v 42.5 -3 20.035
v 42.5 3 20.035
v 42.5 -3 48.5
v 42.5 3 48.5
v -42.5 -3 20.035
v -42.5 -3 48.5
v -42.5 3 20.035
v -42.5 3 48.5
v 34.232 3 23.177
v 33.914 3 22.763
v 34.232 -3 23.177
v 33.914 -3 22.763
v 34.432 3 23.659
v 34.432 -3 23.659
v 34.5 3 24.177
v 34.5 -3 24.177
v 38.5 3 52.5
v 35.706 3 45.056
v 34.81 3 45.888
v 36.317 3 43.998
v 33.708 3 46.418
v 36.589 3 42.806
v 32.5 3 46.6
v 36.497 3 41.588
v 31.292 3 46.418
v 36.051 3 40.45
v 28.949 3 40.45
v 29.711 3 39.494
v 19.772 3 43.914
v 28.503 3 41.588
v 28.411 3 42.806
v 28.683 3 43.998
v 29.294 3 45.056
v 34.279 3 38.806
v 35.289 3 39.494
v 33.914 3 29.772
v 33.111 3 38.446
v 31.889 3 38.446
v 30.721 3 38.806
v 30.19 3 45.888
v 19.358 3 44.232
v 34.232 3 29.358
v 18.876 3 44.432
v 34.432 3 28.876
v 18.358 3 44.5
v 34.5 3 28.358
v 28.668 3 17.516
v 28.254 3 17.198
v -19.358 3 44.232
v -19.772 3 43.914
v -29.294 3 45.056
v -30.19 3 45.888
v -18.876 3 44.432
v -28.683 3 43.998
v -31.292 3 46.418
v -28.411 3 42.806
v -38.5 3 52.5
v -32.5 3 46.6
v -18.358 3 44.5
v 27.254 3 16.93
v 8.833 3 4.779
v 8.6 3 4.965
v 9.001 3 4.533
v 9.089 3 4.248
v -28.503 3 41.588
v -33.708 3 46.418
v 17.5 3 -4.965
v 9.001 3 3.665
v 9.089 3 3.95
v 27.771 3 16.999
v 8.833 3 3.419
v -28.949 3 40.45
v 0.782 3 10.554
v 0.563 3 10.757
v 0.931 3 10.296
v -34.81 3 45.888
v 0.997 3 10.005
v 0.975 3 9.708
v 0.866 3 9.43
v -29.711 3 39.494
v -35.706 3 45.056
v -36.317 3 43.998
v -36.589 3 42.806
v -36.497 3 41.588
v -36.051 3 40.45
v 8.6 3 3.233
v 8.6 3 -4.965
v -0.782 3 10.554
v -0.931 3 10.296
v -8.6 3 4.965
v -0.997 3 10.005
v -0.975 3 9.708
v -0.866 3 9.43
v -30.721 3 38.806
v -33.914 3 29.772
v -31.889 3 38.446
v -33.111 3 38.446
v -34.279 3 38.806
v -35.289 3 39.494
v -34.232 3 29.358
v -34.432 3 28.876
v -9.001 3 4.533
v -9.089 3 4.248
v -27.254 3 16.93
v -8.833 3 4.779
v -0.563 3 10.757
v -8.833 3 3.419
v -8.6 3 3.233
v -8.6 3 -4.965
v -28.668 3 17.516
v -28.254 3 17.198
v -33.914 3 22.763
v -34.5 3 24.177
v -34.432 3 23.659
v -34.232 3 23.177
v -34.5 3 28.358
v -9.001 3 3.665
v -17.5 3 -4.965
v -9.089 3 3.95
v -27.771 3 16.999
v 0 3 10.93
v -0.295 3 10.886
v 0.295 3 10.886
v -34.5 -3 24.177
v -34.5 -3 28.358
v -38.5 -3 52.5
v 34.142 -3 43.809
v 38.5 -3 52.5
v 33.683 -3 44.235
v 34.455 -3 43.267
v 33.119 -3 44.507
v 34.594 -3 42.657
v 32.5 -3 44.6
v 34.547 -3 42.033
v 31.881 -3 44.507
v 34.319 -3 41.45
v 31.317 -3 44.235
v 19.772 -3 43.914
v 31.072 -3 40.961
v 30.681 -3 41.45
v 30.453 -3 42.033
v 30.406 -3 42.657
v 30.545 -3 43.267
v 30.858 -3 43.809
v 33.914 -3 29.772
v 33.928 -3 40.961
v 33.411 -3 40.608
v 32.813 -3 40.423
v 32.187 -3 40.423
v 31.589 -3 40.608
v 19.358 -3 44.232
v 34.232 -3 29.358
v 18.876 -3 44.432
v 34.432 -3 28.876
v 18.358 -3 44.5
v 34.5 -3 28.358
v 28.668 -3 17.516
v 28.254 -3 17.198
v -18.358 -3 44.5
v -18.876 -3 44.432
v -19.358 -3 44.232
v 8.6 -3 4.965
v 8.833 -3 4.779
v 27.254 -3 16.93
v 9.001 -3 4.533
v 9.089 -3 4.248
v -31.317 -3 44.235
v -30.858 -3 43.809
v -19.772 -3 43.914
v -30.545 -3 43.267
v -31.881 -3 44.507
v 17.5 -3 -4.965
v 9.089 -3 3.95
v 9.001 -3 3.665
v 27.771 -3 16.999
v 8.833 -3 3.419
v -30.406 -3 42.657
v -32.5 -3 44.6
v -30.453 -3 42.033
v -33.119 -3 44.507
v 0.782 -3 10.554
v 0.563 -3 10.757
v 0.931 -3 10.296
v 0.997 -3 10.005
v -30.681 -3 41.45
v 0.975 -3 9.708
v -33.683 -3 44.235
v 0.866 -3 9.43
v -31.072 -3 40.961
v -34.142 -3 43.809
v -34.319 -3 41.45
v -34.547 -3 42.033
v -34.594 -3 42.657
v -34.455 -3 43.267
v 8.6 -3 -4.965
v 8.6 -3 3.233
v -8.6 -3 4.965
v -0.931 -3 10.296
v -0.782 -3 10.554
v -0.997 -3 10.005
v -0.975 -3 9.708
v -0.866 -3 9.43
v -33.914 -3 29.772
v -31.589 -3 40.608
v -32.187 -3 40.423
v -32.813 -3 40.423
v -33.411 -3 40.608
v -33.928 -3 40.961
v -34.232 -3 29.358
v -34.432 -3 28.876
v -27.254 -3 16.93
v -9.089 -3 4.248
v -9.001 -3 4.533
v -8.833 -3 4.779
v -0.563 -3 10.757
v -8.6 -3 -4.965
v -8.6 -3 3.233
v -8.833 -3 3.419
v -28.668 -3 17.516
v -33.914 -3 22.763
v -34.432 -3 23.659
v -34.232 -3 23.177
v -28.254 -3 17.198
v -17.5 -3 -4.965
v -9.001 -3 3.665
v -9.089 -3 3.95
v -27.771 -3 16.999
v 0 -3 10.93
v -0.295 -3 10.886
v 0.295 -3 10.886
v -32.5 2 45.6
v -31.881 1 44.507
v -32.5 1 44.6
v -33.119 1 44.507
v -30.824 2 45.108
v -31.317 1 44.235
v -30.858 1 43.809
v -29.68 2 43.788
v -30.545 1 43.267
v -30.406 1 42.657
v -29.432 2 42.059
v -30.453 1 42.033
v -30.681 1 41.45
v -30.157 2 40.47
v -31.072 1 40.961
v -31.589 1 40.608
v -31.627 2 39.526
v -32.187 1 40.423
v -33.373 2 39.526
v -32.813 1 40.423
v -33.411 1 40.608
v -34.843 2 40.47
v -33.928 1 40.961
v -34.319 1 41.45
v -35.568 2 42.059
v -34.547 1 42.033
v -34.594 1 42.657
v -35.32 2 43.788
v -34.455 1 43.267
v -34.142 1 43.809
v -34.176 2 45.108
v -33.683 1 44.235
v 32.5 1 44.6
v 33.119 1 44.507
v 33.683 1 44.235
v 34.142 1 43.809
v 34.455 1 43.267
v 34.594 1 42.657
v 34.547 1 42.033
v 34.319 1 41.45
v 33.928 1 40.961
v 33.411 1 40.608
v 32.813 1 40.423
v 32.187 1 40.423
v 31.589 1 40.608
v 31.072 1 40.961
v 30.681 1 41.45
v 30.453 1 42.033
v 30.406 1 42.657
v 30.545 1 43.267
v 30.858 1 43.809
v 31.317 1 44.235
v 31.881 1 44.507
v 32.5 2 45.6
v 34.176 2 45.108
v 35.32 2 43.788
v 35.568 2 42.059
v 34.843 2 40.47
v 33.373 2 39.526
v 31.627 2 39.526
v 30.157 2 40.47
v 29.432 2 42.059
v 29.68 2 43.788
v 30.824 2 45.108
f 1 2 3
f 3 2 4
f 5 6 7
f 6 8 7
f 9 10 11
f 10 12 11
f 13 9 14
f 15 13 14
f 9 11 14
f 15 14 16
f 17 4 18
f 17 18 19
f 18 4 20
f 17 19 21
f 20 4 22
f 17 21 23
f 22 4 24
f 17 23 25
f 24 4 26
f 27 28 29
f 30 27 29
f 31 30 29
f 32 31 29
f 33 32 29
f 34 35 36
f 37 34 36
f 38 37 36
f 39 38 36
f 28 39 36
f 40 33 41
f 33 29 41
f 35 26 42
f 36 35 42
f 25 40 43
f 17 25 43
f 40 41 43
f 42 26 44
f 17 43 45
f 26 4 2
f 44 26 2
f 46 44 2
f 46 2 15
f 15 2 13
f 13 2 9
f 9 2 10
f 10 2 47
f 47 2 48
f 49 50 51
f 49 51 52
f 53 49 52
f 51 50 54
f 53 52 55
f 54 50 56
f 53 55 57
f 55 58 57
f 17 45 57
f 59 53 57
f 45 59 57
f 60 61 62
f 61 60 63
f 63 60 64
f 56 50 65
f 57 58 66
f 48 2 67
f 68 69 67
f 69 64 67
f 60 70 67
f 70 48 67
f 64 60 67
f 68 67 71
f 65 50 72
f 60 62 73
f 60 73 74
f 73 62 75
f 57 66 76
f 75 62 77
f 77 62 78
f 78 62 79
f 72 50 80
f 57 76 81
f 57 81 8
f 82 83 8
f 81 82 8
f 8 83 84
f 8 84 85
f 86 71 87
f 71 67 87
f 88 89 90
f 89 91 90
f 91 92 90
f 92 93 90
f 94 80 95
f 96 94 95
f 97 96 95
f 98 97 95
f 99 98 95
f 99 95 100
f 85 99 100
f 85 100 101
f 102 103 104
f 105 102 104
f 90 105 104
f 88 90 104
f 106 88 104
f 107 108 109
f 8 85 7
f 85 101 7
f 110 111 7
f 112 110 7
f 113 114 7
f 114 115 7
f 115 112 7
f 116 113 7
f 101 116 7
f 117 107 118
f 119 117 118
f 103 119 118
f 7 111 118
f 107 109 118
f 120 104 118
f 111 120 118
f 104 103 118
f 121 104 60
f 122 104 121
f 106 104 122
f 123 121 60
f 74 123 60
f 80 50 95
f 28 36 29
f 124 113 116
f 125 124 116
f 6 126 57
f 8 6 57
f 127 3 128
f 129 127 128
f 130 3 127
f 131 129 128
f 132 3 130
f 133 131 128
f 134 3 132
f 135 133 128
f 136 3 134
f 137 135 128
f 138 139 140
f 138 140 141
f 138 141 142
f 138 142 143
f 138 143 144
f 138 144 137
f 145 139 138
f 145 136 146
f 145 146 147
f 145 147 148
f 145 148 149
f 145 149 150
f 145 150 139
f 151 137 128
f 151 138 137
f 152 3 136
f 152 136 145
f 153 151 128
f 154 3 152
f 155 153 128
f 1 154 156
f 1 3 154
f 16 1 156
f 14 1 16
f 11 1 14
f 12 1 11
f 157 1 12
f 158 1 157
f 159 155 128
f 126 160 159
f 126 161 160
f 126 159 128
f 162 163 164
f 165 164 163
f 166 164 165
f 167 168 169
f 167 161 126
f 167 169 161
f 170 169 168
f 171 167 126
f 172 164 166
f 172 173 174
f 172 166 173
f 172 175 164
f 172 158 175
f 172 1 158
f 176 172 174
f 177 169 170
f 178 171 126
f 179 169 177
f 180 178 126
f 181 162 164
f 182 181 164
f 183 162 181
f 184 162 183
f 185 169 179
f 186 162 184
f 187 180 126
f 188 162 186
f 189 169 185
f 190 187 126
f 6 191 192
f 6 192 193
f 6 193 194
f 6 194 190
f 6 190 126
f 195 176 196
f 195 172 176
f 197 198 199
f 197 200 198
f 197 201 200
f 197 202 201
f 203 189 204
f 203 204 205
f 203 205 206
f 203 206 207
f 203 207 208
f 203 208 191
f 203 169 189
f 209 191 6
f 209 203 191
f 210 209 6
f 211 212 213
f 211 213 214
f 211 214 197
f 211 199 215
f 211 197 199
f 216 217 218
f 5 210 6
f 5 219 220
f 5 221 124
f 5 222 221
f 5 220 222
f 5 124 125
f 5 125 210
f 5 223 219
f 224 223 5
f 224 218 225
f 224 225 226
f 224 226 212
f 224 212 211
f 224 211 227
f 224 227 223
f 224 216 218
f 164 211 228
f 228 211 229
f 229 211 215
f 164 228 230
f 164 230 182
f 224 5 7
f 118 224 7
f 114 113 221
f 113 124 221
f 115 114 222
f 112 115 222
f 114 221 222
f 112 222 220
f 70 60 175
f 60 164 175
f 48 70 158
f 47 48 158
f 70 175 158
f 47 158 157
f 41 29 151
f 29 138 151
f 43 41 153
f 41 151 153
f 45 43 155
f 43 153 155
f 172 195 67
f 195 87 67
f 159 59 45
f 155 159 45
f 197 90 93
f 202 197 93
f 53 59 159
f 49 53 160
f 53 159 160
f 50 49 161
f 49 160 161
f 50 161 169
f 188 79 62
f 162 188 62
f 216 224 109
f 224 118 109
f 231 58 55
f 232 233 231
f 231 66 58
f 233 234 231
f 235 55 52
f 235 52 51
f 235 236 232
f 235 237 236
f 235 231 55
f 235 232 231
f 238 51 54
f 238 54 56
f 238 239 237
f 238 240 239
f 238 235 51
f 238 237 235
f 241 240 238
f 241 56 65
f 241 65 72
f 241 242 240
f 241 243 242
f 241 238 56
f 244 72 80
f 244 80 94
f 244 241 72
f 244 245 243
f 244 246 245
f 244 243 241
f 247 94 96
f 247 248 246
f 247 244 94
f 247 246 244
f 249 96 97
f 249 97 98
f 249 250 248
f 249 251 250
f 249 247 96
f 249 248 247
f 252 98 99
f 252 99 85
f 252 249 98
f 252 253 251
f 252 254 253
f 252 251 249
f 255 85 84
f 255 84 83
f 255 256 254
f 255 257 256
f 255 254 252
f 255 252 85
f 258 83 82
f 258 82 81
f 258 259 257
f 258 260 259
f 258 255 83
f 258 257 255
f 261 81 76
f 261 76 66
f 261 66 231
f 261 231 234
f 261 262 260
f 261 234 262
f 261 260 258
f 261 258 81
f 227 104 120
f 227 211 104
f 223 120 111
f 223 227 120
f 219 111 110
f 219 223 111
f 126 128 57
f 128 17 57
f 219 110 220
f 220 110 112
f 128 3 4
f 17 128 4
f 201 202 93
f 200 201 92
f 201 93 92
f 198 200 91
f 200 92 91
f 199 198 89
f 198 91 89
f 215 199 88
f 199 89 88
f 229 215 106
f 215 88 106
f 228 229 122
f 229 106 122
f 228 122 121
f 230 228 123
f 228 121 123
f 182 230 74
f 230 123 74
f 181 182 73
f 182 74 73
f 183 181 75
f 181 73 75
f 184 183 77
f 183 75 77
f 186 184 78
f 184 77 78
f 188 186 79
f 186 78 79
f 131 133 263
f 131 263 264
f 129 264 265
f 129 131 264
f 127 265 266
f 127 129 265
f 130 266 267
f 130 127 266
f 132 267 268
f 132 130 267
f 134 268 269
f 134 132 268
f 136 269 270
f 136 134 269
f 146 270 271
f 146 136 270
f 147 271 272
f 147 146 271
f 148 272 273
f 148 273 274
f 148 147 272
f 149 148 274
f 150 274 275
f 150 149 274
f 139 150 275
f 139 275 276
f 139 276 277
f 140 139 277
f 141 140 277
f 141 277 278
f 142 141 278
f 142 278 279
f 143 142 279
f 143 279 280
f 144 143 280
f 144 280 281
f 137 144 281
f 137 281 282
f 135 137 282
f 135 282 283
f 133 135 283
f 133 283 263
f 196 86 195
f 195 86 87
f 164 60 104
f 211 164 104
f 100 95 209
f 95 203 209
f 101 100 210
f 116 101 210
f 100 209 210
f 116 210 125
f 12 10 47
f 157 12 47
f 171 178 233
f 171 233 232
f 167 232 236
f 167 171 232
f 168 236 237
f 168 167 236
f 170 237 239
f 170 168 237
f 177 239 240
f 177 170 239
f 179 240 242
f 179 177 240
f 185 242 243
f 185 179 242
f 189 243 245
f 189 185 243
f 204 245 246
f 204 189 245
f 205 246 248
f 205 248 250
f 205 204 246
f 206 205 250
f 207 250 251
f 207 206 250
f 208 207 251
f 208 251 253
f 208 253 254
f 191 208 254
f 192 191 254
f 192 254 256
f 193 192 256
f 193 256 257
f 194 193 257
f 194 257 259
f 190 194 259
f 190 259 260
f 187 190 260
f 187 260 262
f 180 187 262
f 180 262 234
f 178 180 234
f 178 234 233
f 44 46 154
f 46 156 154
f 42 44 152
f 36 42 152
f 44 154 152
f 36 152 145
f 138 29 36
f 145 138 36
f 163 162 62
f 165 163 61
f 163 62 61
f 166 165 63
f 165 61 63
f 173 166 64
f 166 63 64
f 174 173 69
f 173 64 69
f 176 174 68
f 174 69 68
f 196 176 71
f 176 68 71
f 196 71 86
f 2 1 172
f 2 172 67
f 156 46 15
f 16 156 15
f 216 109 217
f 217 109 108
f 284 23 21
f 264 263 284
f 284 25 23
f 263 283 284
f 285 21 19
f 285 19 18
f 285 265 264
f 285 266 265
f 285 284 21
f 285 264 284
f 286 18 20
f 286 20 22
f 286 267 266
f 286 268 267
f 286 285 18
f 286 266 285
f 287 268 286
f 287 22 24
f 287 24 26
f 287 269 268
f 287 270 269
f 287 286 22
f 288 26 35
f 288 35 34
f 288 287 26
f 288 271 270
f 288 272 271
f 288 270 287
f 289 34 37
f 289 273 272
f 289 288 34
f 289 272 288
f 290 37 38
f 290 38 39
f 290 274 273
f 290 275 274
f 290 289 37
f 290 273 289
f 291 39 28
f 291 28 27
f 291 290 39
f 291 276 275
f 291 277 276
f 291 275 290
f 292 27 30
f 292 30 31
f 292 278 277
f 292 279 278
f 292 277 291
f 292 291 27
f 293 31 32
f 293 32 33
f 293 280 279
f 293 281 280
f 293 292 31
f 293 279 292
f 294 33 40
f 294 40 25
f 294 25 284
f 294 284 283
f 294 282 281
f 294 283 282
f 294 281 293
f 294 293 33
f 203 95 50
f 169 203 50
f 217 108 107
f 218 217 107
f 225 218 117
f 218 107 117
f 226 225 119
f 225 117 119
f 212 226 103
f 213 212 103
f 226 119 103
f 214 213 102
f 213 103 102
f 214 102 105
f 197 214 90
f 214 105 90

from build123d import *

# Parameters (mm, degrees)
SKETCH_1_R          = 2.1
EXTRUDE_1_DEPTH     = 3
CHAMFER_1_SIZE      = 25
SKETCH_4_R          = 1
CUT_EXTRUDE_1_DEPTH = 68.812240783
CUT_EXTRUDE_2_DEPTH = 68.812240783
CHAMFER_2_SIZE      = 4
FILLET_1_R          = 2
CHAMFER_3_SIZE      = 2


with BuildPart() as part:
    # 草图1 → 凸台-拉伸1 (new, symmetric)
    with BuildSketch(Plane(origin=(0, 0, 0), x_dir=(1, 0, 0), z_dir=(0, 1, 0))):
        Polygon((-8.6, 4.965212315), (-8.6, -4.965212315), (0, -9.93042463), (8.6, -4.965212315), (8.6, 4.965212315), (42.5, 4.965212315), (42.5, -52.5), (-42.5, -52.5), (-42.5, 4.965212315), align=None)
        with Locations(Location((-32.5, -42.5, 0), (0, 0, 270))):
            Circle(SKETCH_1_R, mode=Mode.SUBTRACT)
        with Locations(Location((32.5, -42.5, 0), (0, 0, 270))):
            Circle(SKETCH_1_R, mode=Mode.SUBTRACT)
    extrude(amount=EXTRUDE_1_DEPTH, both=True)

    # 倒角1
    chamfer_1_edges = [part.edges().sort_by_distance(p)[0] for p in [
        (42.5, 0, -4.965212315),
        (-42.5, 0, -4.965212315),
    ]]
    chamfer(chamfer_1_edges, length=CHAMFER_1_SIZE)

    # 草图4 → 切除-拉伸1 (cut, through all)
    with BuildSketch(Plane(origin=(0, 3, 0), x_dir=(1, 0, 0), z_dir=(0, 1, 0))):
        with Locations((0, -9.93042463)):
            Circle(SKETCH_4_R)
        with Locations((-8.1, -4.099186911)):
            Circle(SKETCH_4_R)
        with Locations((8.1, -4.099186911)):
            Circle(SKETCH_4_R)
    extrude(amount=-CUT_EXTRUDE_1_DEPTH, mode=Mode.SUBTRACT)

    # 草图3 → 切除-拉伸2 (cut, through all)
    with BuildSketch(Plane(origin=(0, 3, 0), x_dir=(1, 0, 0), z_dir=(0, 1, 0))):
        Polygon((-28.081928446, -16.93042463), (-34.5, -23.348496184), (-34.5, -29.186291501), (-19.186291501, -44.5), (19.186291501, -44.5), (34.5, -29.186291501), (34.5, -23.348496184), (28.081928446, -16.93042463), align=None)
    extrude(amount=-CUT_EXTRUDE_2_DEPTH, mode=Mode.SUBTRACT)

    # 倒角2
    chamfer_2_edges = [part.edges().sort_by_distance(p)[0] for p in [
        (42.5, 0, 52.5),
        (-42.5, 0, 52.5),
    ]]
    chamfer(chamfer_2_edges, length=CHAMFER_2_SIZE)

    # 圆角1
    fillet_1_edges = [part.edges().sort_by_distance(p)[0] for p in [
        (-28.081928446, 0, 16.93042463),
        (28.081928446, 0, 16.93042463),
        (34.5, 0, 23.348496184),
        (34.5, 0, 29.186291501),
        (19.186291501, 0, 44.5),
        (-19.186291501, 0, 44.5),
        (-34.5, 0, 29.186291501),
        (-34.5, 0, 23.348496184),
    ]]
    fillet(fillet_1_edges, radius=FILLET_1_R)

    # 倒角3
    chamfer_3_edges = [part.edges().sort_by_distance(p)[0] for p in [
        (-32.5, 3, 40.4),
        (32.5, 3, 40.4),
    ]]
    chamfer(chamfer_3_edges, length=CHAMFER_3_SIZE)


solid = part.part
